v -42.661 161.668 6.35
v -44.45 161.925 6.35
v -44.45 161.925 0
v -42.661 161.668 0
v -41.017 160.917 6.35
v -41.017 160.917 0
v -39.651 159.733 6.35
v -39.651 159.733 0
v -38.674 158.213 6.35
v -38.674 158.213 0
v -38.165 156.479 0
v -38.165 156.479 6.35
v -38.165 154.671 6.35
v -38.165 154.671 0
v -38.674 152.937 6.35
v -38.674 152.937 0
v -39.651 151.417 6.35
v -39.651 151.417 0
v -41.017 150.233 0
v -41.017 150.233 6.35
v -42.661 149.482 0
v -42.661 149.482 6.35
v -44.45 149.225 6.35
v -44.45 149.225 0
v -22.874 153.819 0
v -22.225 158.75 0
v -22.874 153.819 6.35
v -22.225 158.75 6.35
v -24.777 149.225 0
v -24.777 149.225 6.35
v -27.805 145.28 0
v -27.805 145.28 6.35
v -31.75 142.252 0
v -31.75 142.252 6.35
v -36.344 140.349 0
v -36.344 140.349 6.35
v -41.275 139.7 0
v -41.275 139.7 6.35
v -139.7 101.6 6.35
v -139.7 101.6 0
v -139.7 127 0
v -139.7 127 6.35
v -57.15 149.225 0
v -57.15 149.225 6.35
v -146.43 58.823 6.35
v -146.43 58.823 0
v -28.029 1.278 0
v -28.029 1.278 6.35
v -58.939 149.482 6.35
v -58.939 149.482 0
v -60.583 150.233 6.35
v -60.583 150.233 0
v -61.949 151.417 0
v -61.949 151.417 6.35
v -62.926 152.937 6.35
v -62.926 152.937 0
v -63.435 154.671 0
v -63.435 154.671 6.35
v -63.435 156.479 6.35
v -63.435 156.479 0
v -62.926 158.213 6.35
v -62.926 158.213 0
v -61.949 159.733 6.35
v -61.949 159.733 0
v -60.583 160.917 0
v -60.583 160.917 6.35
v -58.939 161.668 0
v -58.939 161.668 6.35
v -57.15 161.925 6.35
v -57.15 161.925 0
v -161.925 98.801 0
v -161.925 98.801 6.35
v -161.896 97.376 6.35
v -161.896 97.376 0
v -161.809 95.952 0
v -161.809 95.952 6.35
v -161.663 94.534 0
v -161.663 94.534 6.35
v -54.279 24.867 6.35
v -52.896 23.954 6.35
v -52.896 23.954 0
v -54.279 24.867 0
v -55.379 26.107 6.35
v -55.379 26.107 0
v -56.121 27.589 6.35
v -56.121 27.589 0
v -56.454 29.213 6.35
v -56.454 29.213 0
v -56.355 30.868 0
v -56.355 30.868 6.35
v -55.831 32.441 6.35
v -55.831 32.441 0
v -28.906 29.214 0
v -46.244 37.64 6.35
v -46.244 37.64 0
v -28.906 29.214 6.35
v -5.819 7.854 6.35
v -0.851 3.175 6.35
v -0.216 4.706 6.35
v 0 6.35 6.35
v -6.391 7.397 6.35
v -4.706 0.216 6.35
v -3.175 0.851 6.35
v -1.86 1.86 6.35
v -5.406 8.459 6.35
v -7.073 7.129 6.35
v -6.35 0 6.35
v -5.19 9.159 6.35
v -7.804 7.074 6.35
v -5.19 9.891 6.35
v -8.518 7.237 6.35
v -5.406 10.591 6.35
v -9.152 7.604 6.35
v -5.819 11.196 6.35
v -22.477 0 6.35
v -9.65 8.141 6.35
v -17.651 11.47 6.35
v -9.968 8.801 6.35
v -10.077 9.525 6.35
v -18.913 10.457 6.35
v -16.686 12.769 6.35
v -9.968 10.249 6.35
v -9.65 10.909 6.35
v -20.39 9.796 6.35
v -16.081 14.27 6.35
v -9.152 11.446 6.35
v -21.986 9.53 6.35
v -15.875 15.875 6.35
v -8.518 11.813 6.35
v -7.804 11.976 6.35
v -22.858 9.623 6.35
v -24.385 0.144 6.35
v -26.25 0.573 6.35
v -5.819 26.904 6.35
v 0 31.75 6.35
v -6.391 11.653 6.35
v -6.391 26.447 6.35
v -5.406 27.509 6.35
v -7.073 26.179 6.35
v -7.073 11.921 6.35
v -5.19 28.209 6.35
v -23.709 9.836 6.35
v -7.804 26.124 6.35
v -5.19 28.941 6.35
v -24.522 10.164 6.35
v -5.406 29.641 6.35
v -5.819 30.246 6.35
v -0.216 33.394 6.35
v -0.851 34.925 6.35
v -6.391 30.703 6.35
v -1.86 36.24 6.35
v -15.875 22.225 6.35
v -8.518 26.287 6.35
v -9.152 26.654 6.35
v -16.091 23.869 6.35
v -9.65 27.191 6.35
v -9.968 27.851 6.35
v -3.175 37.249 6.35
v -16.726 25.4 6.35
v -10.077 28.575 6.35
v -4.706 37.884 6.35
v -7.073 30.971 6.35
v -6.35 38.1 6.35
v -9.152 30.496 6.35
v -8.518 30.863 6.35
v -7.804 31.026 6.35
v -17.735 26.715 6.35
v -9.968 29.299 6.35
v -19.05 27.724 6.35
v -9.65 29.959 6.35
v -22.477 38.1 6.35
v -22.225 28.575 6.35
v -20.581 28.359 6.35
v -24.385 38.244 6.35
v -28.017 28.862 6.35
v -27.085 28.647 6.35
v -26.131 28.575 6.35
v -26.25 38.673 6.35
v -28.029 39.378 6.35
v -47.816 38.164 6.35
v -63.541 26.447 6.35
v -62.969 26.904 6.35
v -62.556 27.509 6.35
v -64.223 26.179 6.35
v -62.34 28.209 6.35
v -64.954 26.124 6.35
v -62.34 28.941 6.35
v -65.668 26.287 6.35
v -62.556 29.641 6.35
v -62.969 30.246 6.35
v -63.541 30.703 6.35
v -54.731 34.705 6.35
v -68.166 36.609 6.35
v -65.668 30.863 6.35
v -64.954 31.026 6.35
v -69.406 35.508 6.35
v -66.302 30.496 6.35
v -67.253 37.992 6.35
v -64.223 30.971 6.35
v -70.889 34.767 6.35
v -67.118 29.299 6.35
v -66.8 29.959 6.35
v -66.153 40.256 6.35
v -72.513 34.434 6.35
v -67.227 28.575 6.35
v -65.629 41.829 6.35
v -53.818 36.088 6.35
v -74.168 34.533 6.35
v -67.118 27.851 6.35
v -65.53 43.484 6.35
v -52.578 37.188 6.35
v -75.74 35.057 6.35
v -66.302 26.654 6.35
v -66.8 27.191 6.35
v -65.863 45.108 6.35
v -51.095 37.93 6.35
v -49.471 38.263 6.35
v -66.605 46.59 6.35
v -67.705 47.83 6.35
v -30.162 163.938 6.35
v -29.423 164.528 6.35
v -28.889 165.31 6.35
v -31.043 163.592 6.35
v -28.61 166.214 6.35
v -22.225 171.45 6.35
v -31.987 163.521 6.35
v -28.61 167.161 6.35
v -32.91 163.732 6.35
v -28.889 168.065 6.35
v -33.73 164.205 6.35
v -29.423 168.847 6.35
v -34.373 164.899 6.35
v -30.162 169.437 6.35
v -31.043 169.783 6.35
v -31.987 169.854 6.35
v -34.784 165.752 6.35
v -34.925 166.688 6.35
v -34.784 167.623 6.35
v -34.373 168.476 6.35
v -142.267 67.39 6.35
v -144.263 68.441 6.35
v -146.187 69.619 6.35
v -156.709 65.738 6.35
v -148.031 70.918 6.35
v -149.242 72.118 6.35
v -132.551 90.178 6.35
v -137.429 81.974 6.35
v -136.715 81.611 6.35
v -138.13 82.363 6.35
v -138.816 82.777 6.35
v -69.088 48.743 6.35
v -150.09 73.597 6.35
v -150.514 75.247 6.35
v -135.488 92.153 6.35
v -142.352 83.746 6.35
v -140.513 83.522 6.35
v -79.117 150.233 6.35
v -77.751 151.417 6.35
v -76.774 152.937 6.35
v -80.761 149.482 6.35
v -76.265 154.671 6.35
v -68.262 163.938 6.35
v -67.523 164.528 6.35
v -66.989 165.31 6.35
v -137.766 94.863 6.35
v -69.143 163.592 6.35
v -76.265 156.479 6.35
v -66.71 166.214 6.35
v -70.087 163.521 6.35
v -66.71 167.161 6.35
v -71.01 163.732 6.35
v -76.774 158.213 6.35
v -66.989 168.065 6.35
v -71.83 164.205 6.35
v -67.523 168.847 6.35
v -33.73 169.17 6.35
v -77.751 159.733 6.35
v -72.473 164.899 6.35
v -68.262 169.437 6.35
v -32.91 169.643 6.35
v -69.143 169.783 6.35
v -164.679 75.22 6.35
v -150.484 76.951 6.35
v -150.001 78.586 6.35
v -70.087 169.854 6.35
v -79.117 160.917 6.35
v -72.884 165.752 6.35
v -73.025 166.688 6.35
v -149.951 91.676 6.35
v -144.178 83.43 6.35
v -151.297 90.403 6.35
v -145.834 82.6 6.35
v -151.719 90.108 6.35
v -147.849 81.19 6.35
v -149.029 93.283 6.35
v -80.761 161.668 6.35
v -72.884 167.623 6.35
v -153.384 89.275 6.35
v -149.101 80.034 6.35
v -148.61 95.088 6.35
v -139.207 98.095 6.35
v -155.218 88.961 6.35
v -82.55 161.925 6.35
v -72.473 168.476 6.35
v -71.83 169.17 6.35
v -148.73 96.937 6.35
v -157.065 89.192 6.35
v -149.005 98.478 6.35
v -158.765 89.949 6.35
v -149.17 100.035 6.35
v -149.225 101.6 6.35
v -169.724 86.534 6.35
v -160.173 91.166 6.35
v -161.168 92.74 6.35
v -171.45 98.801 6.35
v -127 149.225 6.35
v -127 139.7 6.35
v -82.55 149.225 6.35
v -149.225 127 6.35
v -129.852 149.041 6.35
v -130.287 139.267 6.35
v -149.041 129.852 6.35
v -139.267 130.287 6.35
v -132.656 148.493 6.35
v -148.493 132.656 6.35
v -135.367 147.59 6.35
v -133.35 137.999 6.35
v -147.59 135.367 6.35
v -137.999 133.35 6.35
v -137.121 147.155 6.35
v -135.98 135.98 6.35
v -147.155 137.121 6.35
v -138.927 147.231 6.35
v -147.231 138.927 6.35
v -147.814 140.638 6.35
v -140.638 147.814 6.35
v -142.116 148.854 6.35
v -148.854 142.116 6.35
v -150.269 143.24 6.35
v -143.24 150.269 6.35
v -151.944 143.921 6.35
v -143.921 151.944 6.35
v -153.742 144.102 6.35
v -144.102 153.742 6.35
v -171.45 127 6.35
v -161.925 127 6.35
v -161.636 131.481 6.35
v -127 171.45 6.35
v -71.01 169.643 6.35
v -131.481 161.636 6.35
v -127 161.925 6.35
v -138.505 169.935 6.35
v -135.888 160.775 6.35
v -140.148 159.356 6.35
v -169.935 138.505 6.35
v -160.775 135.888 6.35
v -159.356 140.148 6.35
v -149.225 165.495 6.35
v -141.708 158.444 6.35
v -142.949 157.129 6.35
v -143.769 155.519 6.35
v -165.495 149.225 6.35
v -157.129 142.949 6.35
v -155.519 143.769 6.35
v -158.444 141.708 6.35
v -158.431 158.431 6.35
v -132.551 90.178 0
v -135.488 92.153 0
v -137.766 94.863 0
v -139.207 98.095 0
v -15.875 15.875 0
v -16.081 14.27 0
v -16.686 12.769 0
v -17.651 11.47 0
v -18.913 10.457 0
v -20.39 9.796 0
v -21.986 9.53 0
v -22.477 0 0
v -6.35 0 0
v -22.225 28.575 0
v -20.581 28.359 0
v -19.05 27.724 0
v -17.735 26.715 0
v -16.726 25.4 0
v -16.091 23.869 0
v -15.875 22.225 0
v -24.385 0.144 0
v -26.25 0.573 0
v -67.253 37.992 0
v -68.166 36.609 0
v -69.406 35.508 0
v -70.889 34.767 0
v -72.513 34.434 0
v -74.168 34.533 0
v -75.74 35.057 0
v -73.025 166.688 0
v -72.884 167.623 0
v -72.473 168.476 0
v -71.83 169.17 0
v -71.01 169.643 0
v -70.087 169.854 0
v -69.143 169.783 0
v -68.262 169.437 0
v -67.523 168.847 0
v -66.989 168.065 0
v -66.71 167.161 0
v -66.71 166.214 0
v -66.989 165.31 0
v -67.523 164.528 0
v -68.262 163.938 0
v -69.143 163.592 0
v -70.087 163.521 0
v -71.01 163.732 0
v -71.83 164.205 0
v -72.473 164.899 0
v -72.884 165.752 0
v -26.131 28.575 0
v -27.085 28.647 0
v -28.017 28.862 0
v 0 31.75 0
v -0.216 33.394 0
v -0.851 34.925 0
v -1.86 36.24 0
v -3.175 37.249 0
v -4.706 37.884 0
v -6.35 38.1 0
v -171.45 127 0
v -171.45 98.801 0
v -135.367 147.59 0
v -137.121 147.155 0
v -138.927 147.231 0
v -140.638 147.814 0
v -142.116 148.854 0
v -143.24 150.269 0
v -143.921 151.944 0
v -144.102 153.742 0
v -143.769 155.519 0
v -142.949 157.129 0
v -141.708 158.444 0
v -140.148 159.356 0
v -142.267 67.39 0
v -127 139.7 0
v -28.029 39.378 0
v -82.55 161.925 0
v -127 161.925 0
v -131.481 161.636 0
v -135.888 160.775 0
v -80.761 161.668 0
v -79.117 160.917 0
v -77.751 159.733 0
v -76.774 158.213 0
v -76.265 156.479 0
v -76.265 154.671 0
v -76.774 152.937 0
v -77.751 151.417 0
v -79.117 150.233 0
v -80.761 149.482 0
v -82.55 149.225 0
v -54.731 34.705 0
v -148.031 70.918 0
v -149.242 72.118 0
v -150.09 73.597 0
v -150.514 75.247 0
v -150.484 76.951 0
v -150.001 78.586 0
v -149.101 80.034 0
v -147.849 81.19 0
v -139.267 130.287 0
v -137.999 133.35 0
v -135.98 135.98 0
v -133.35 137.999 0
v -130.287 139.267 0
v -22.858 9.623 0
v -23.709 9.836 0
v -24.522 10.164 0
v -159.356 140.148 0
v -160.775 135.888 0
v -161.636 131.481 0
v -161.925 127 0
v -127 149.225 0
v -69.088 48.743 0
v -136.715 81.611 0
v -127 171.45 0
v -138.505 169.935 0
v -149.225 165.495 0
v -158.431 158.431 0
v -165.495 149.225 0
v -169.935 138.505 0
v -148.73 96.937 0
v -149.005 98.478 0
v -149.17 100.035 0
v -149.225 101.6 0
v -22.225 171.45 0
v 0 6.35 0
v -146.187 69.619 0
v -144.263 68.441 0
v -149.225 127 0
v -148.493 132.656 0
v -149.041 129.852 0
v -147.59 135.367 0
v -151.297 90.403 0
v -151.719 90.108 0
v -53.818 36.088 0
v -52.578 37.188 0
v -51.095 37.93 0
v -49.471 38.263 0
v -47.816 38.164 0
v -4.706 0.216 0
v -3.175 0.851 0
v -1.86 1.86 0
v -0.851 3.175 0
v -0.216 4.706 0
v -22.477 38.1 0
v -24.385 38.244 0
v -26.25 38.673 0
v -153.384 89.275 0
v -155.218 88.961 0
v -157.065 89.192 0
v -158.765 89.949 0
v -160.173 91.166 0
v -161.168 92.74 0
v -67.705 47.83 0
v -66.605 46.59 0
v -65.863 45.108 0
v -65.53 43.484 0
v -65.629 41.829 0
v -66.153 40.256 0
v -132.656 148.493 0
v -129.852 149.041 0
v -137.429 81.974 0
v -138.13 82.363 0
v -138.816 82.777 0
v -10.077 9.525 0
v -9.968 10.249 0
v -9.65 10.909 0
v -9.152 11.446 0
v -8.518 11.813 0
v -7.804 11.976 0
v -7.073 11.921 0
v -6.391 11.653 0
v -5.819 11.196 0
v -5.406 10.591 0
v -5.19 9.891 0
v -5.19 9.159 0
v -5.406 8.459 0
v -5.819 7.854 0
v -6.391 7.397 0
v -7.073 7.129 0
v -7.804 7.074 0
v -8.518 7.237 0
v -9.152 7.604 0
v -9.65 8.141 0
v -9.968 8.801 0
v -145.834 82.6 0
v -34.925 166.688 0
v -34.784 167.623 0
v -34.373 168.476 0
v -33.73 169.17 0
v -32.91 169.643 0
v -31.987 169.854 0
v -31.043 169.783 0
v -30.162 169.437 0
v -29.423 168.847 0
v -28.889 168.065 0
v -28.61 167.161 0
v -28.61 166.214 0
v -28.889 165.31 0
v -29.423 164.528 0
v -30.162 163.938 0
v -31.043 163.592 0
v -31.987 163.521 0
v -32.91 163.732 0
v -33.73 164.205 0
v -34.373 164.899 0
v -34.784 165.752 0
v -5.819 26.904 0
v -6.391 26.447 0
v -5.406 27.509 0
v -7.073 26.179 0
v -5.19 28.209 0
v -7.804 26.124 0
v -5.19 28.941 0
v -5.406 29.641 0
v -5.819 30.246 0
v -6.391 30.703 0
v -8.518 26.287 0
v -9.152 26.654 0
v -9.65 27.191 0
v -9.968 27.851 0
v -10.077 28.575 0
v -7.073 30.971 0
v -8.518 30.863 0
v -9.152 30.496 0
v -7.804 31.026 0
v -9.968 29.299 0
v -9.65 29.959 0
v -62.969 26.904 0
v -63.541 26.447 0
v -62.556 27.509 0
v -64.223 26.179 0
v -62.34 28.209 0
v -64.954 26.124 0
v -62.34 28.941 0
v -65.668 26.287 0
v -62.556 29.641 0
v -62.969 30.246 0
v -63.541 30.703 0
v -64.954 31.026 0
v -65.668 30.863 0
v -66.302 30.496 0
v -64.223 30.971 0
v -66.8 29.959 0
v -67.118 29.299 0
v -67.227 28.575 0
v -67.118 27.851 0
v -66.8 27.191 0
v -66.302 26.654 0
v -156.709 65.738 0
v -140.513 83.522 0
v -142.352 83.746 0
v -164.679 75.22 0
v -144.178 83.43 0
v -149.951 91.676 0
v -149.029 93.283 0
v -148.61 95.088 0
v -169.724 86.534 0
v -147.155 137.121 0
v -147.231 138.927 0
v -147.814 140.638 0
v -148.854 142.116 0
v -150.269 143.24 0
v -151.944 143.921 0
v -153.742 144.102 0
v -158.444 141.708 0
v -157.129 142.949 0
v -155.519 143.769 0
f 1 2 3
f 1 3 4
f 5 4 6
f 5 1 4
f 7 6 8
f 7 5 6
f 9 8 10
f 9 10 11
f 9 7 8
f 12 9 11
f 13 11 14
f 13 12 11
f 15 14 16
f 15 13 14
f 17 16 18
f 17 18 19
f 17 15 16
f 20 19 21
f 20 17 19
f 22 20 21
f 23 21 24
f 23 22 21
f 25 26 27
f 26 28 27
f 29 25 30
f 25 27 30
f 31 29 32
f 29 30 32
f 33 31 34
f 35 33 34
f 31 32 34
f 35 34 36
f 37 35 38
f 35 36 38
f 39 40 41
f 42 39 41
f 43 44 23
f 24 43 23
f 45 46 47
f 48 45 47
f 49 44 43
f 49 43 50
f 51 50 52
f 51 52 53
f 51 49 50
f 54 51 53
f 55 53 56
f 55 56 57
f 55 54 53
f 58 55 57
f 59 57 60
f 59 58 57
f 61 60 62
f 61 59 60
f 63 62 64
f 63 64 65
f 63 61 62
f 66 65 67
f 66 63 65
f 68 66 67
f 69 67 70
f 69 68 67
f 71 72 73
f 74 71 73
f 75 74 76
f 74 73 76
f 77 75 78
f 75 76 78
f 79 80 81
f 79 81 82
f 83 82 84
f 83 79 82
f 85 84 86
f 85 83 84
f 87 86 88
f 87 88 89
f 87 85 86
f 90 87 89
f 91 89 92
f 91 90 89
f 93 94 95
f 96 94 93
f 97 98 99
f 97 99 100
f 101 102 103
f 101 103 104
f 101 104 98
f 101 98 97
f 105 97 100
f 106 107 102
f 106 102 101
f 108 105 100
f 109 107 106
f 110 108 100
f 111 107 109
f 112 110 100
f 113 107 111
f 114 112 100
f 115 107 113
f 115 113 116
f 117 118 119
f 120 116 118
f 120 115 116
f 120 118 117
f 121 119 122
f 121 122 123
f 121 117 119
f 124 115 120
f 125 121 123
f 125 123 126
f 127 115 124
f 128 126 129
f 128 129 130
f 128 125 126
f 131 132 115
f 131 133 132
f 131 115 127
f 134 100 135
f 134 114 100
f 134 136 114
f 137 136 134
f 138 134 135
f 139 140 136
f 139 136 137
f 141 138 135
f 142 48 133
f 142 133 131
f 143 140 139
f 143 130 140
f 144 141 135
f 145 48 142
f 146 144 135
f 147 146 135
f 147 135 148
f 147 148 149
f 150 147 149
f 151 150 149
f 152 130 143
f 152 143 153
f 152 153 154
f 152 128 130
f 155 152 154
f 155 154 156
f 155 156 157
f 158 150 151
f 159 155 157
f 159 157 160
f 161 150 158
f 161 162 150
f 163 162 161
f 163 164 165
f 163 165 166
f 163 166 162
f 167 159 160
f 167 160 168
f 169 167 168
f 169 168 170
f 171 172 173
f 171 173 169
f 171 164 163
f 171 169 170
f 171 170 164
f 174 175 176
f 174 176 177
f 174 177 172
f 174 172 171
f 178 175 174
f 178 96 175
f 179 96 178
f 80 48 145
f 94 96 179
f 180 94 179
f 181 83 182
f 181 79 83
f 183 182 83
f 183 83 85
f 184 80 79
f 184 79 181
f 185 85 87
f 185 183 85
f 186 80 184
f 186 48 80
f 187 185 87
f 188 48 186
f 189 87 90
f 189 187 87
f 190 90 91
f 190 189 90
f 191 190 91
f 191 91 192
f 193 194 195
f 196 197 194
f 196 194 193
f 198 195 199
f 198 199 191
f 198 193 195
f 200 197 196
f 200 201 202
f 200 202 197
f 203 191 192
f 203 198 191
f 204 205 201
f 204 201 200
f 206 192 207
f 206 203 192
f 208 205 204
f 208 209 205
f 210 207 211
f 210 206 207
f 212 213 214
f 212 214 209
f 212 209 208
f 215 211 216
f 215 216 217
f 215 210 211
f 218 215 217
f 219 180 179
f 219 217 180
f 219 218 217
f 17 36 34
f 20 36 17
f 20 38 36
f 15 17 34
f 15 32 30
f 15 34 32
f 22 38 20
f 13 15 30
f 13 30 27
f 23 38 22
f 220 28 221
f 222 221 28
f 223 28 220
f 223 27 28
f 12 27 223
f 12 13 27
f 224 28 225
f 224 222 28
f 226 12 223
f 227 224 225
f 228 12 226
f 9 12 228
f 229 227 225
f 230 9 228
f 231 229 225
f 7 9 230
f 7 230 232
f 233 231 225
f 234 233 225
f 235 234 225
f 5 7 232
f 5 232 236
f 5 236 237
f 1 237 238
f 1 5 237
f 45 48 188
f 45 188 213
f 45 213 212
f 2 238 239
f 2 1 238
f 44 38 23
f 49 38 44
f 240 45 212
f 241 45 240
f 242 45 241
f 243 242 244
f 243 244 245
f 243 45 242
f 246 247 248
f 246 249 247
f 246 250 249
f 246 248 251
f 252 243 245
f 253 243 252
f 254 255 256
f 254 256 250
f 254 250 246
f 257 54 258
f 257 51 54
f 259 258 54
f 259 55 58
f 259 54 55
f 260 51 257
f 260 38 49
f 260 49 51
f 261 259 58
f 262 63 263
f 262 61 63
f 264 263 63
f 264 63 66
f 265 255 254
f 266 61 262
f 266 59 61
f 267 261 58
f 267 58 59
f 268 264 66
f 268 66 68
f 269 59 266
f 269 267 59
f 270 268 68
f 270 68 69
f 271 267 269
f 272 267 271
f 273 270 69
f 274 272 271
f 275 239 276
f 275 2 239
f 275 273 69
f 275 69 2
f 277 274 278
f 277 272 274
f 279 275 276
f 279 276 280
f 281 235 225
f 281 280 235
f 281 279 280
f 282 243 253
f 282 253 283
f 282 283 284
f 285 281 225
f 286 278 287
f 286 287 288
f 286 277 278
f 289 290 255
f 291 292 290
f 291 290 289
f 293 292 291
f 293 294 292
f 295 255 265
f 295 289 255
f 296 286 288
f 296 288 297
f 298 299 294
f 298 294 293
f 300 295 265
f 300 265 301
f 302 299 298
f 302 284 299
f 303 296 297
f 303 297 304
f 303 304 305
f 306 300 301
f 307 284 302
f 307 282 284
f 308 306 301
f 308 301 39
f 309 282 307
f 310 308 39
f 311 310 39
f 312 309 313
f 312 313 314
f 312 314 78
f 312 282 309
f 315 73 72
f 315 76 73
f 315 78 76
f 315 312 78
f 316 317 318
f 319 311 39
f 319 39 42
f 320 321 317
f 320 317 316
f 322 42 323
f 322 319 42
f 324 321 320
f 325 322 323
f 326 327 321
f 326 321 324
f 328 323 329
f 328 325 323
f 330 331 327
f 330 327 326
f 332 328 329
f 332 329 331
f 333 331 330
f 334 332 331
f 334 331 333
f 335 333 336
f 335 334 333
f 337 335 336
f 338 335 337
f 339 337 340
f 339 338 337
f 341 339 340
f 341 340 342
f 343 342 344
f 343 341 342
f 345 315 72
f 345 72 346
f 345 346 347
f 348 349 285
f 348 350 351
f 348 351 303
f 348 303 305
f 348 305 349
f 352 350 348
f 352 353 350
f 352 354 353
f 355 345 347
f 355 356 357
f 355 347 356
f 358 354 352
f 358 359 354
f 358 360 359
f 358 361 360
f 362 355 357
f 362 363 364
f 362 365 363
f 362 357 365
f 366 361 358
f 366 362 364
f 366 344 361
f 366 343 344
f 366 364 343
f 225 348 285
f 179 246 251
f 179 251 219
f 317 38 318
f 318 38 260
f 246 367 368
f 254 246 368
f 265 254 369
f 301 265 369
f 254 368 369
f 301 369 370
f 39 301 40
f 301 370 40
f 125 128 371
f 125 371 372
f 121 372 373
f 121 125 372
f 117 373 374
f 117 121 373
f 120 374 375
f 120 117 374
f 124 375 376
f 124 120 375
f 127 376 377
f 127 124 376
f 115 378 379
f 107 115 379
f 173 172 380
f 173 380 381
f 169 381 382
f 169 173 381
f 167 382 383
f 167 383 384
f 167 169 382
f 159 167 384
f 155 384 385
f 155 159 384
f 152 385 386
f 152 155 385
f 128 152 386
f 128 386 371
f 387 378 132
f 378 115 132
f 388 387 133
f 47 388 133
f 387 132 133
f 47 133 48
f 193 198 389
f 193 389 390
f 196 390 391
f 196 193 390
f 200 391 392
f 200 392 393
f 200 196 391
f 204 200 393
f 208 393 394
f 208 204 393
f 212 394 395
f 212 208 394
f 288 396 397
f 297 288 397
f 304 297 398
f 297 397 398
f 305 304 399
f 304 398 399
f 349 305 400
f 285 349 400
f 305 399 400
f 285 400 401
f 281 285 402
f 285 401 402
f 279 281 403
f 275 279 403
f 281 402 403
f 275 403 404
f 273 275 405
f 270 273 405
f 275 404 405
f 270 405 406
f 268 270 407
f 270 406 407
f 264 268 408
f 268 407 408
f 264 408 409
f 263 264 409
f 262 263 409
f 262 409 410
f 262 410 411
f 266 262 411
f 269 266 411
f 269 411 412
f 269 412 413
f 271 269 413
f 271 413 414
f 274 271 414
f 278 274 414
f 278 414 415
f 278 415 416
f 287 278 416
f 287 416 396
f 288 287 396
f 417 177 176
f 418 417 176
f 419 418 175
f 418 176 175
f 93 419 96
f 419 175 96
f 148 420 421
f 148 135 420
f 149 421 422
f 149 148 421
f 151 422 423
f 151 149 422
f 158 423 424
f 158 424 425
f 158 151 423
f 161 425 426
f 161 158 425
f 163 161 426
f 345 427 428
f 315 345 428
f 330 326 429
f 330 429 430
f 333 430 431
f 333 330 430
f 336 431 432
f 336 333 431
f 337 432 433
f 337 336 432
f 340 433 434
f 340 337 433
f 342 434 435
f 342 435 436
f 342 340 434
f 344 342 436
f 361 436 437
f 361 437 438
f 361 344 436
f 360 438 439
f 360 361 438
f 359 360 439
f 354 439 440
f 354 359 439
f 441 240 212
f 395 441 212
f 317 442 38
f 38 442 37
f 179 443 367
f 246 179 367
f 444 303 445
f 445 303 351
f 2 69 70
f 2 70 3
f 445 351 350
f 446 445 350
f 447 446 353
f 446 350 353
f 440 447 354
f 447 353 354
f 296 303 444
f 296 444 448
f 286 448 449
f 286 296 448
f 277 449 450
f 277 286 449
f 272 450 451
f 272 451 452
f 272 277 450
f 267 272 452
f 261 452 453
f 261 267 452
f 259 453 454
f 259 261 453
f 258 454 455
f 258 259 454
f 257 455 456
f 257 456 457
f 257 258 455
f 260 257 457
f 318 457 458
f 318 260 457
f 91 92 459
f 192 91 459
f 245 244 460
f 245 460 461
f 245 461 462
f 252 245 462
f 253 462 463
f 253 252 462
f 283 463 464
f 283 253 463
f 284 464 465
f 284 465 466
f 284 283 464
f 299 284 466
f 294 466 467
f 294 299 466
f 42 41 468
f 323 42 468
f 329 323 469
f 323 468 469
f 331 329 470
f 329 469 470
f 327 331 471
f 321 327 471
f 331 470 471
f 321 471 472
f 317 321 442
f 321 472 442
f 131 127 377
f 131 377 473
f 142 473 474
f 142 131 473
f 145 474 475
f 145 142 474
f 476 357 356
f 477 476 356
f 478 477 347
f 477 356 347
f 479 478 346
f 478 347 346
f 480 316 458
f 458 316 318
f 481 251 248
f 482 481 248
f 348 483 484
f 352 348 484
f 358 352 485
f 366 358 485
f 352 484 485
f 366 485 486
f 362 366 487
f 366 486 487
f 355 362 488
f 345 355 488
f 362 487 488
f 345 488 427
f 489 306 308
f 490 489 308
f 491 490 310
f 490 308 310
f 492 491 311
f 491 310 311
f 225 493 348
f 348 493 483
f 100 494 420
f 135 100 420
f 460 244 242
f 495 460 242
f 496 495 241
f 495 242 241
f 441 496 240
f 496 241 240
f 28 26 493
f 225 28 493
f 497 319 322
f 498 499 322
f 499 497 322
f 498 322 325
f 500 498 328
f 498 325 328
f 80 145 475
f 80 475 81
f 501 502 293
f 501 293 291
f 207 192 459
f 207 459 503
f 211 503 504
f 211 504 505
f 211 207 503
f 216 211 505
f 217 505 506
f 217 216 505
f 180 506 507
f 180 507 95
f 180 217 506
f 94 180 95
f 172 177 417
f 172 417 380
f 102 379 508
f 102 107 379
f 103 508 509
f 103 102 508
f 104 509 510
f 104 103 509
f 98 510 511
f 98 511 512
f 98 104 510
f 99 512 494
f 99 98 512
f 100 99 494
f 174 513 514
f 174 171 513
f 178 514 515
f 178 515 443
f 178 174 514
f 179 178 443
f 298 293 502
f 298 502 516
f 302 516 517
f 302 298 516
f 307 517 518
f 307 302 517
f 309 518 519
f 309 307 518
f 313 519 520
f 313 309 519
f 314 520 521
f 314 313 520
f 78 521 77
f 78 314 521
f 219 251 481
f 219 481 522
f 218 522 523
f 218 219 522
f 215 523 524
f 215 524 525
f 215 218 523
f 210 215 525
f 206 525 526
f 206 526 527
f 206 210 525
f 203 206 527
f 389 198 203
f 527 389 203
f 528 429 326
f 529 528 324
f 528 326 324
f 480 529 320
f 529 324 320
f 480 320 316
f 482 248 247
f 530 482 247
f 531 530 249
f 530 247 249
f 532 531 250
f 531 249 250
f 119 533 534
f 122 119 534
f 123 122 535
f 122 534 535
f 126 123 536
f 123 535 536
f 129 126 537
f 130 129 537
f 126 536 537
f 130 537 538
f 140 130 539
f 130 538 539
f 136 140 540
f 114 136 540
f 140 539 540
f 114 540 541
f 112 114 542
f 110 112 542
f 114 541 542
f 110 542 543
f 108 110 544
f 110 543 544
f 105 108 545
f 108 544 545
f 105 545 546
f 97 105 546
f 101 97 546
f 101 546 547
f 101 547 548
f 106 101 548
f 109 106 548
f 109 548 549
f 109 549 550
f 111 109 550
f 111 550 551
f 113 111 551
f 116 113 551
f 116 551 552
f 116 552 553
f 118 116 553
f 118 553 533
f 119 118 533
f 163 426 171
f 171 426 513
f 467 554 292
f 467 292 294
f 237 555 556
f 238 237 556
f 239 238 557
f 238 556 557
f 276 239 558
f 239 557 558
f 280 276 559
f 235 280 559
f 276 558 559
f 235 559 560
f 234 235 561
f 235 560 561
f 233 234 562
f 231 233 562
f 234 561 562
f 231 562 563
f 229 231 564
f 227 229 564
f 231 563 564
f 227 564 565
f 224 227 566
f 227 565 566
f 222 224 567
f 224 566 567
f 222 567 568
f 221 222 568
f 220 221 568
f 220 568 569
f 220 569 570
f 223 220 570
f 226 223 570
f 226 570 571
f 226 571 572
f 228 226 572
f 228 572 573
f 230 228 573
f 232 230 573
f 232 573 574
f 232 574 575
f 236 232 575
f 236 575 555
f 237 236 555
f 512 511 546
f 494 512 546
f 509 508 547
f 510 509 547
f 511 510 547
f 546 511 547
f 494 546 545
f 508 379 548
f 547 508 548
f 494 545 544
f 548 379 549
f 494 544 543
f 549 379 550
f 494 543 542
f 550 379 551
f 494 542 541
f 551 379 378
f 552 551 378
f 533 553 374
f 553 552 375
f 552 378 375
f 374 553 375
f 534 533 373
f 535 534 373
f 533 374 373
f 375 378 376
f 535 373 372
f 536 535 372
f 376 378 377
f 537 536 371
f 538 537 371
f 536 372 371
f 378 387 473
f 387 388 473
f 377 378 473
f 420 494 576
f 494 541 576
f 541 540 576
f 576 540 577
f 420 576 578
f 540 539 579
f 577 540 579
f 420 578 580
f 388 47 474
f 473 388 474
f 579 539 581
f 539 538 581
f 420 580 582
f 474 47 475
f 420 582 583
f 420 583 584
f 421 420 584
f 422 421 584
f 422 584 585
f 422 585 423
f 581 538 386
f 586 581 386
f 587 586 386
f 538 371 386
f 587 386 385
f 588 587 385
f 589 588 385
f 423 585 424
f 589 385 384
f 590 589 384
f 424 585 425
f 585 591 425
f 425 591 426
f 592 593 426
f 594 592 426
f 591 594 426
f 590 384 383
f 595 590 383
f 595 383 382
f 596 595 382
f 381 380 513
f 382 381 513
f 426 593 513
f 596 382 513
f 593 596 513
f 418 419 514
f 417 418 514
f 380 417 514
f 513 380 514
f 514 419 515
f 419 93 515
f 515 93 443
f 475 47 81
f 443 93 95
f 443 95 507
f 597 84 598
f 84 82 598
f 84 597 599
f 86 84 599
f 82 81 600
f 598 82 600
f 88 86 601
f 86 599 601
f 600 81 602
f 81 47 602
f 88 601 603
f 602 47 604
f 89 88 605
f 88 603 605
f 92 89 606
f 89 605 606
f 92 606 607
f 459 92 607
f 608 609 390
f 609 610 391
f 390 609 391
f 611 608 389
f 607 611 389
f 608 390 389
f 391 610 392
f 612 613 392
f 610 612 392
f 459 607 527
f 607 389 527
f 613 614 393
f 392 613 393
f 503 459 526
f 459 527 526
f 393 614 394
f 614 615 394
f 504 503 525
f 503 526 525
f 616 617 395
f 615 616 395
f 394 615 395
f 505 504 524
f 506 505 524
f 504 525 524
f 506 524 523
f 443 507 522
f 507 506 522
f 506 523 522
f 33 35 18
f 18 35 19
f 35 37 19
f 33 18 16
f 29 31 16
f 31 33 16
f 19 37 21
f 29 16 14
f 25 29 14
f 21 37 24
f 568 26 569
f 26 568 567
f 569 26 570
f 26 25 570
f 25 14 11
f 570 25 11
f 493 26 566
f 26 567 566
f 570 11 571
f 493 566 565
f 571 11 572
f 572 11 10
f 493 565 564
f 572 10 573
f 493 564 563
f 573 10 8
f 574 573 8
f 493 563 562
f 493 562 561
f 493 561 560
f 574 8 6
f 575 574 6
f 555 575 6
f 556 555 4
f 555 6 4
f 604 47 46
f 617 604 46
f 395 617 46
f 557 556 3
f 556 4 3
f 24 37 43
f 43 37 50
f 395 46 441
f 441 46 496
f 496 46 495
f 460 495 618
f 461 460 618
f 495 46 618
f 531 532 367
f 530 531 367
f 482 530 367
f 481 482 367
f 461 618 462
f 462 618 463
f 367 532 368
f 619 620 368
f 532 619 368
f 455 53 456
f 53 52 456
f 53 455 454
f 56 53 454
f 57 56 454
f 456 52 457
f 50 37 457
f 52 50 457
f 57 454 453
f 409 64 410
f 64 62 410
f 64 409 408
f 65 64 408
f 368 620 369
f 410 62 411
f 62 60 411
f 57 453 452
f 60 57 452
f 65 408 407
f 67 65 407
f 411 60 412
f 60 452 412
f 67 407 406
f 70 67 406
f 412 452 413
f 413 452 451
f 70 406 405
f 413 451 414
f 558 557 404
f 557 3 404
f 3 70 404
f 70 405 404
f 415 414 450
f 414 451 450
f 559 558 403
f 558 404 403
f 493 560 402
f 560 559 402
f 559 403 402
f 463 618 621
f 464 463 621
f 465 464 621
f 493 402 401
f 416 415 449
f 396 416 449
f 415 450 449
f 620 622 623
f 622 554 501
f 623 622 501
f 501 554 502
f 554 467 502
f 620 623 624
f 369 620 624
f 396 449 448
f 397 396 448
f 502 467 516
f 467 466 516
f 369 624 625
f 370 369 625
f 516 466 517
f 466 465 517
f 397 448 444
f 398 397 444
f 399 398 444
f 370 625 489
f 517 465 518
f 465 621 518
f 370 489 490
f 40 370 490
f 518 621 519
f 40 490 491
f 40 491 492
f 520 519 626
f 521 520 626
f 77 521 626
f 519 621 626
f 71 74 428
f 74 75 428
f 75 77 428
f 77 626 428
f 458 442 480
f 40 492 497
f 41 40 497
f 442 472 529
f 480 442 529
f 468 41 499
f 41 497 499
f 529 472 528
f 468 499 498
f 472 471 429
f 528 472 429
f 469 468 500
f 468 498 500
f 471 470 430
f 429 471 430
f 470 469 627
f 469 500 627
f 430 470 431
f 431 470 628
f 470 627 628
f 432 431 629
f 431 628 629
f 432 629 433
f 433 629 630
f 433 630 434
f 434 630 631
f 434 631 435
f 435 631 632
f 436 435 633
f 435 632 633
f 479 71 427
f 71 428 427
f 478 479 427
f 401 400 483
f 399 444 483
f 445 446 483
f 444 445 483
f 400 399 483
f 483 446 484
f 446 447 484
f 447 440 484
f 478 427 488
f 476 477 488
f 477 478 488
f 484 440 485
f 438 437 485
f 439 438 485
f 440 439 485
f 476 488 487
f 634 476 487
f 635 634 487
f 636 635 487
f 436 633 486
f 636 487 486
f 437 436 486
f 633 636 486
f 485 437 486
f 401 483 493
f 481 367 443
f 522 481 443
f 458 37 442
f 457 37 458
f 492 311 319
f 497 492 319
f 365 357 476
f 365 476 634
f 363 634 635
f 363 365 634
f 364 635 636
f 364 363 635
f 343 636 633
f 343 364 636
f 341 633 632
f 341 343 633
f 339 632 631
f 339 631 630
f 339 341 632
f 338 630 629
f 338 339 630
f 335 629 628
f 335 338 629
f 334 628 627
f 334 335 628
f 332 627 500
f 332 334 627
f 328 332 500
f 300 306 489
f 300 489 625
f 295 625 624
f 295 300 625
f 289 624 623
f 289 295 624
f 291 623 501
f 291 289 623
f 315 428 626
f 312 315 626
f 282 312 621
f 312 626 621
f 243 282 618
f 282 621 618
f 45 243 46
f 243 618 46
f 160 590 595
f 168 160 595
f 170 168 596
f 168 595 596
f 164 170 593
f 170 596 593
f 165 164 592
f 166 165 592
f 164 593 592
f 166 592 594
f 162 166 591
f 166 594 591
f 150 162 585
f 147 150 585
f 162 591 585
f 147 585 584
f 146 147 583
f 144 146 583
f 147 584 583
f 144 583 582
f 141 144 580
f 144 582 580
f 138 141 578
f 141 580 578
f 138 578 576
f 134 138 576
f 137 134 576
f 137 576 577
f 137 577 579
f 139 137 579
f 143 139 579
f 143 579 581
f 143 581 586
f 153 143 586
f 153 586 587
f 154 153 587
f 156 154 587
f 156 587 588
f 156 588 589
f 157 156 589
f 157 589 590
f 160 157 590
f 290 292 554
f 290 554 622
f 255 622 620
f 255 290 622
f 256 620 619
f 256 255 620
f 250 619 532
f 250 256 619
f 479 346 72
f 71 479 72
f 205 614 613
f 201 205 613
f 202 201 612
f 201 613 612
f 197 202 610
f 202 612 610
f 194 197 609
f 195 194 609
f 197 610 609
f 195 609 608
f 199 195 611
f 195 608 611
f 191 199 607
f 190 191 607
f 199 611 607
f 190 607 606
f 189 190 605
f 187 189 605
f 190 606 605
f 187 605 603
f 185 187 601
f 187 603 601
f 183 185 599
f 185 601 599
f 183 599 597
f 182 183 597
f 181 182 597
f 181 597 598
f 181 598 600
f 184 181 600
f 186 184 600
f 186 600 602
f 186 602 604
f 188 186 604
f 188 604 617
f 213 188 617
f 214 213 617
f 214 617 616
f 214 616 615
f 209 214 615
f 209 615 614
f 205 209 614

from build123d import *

# Parameters (mm, degrees)
BOSS_EXTRUDE1_DEPTH              = 6.35
F_1_4_0_25_DIAMETER_HOLE1_D      = 6.35
F_1_4_0_25_DIAMETER_HOLE1_DEPTH  = 9.652
F_1_4_0_25_DIAMETER_HOLE1_TIP    = 1.9077324654125039
F_10_0_1935_DIAMETER_HOLE1_D     = 4.9149
F_10_0_1935_DIAMETER_HOLE1_DEPTH = 9.652
F_10_0_1935_DIAMETER_HOLE1_TIP   = 1.476584928229278
FILLET1_R                        = 12.7
FILLET2_R                        = 6.35
SKETCH8_W                        = 25.40000000000005
SKETCH8_H                        = 12.699999999999989
CUT_EXTRUDE3_DEPTH               = 243.55005153576033
FILLET4_R                        = 6.35
FILLET5_R                        = 19.05


with BuildPart() as part:
    # Sketch1 → Boss-Extrude1 (new body)
    with BuildSketch(Plane.XY):
        with BuildLine():
            Line((0, 0), (0, 38.1))
            Line((0, 38.1), (-25.400000000000002, 38.1))
            Line((-25.400000000000002, 38.1), (-132.55149215165815, 90.17761255734695))
            ThreePointArc((-132.55149215165815, 90.17761255734695), (-137.76554574385477, 94.862565411303), (-139.70000000000002, 101.6))
            Line((-139.70000000000002, 101.6), (-139.70000000000002, 127))
            ThreePointArc((-139.70000000000002, 127), (-135.98025612106917, 135.98025612106917), (-127, 139.69999999999996))
            Line((-127, 139.69999999999996), (-22.22499999999998, 139.7))
            Line((-22.22499999999998, 139.7), (-22.224999999999984, 171.45))
            Line((-22.224999999999984, 171.45), (-127, 171.45))
            ThreePointArc((-127, 171.45), (-158.430896423742, 158.43089642374204), (-171.45, 127))
            Line((-171.45, 127), (-171.45, 98.80128898397304))
            ThreePointArc((-171.45, 98.80128898397304), (-164.67941010349165, 75.22026792353354), (-146.43022253080355, 58.82293293468738))
            Line((-146.43022253080355, 58.82293293468738), (-25.4, -3.11e-15))
            Line((-25.4, -3.11e-15), (0, 0))
        make_face()
    extrude(amount=BOSS_EXTRUDE1_DEPTH)

    # 1/4 (0.25) Diameter Hole1
    with Locations(Plane.XY.offset(6.35)):
        with Locations((-69.85, 166.6875), (-31.75, 166.6875)):
            Hole(F_1_4_0_25_DIAMETER_HOLE1_D / 2, depth=F_1_4_0_25_DIAMETER_HOLE1_DEPTH)
            with Locations((0, 0, -(F_1_4_0_25_DIAMETER_HOLE1_DEPTH + F_1_4_0_25_DIAMETER_HOLE1_TIP / 2))):  # 118° drill point
                Cone(0, F_1_4_0_25_DIAMETER_HOLE1_D / 2, F_1_4_0_25_DIAMETER_HOLE1_TIP, mode=Mode.SUBTRACT)

    # #10 (0.1935) Diameter Hole1
    with Locations(Plane.XY.offset(6.35)):
        with Locations((-7.62, 28.575), (-7.62, 9.525), (-64.77, 28.575)):
            Hole(F_10_0_1935_DIAMETER_HOLE1_D / 2, depth=F_10_0_1935_DIAMETER_HOLE1_DEPTH)
            with Locations((0, 0, -(F_10_0_1935_DIAMETER_HOLE1_DEPTH + F_10_0_1935_DIAMETER_HOLE1_TIP / 2))):  # 118° drill point
                Cone(0, F_10_0_1935_DIAMETER_HOLE1_D / 2, F_10_0_1935_DIAMETER_HOLE1_TIP, mode=Mode.SUBTRACT)

    # Fillet1
    fillet1_edges = [part.edges().sort_by_distance(p)[0] for p in [
        (-25.4, -3.11e-15, 3.175),
        (-25.400000000000002, 38.1, 3.175),
    ]]
    fillet(fillet1_edges, radius=FILLET1_R)

    # Fillet2
    fillet2_edges = [part.edges().sort_by_distance(p)[0] for p in [
        (0, 38.1, 3.175),
        (0, 0, 3.175),
    ]]
    fillet(fillet2_edges, radius=FILLET2_R)

    # Sketch8 → Cut-Extrude3 (cut, through all)
    with BuildSketch(Plane.XY.offset(6.35)):
        with BuildLine():
            Line((-76.19999999999997, 161.92499999999998), (-127, 161.92499999999998))
            ThreePointArc((-127, 161.92499999999998), (-138.12882691189947, 160.1044534249545), (-148.09742202888222, 154.83261411968402))
            Line((-148.09742202888222, 154.83261411968402), (-138.98279839171374, 145.71799048251555))
            ThreePointArc((-138.98279839171374, 145.71799048251555), (-133.24272722958852, 148.33023632632685), (-127, 149.225))
            Line((-127, 149.225), (-76.19999999999997, 149.225))
            Line((-76.19999999999997, 149.225), (-76.19999999999997, 161.92499999999998))
        make_face()
        with BuildLine():
            Line((-161.925, 127), (-161.925, 98.80128898397304))
            ThreePointArc((-161.925, 98.80128898397304), (-161.20295128798153, 91.73632272842997), (-159.06666080504155, 84.96348244484211))
            Line((-159.06666080504155, 84.96348244484211), (-147.51497280949854, 93.050934809844))
            ThreePointArc((-147.51497280949854, 93.050934809844), (-148.79330052666535, 97.24079397659989), (-149.225, 101.6))
            Line((-149.225, 101.6), (-149.225, 127))
            ThreePointArc((-149.225, 127), (-148.33023632632688, 133.2427272295885), (-145.71799048251557, 138.98279839171371))
            Line((-145.71799048251557, 138.98279839171371), (-154.83261411968402, 148.09742202888222))
            ThreePointArc((-154.83261411968402, 148.09742202888222), (-160.1044534249545, 138.12882691189947), (-161.925, 127))
        make_face()
        with BuildLine():
            Line((-142.05216791273205, 85.24815404527915), (-154.12206516409194, 76.79789819448892))
            ThreePointArc((-154.12206516409194, 76.79789819448892), (-148.7100954330638, 71.44388813361326), (-142.2666034170599, 67.38972351667718))
            Line((-142.2666034170599, 67.38972351667718), (-70.02909509590478, 32.28095466133805))
            Line((-70.02909509590478, 32.28095466133805), (-63.37728743967065, 45.967279376904486))
            Line((-63.37728743967065, 45.967279376904486), (-136.7151112654018, 81.61082197535714))
            ThreePointArc((-136.7151112654018, 81.61082197535714), (-139.51647217144776, 83.23458278771281), (-142.05216791273205, 85.24815404527915))
        make_face()
        Polygon((-51.95489999701758, 40.415787225246326), (-27.59207003743942, 28.574999999999996), (-15.875, 28.574999999999996), (-15.874999999999996, 9.525000000000002), (-23.20792996256074, 9.524999999999999), (-58.6067076532517, 26.729462509679877), align=None)
        with Locations((-50.79999999999999, 155.575)):
            Rectangle(SKETCH8_W, SKETCH8_H)
    extrude(amount=-CUT_EXTRUDE3_DEPTH, mode=Mode.SUBTRACT)

    # Fillet4
    # the kernel refuses this fillet: 6.35 mm, written as the material it adds along each edge
    with BuildSketch(Plane(origin=(-23.20792996256074, 9.524999999999999, 6.35), x_dir=(-0.899400586035673, 0.43712536627229515, 0), z_dir=(0, 0, -1))) as fillet4_piece_1:
        with BuildLine():
            CenterArc((FILLET4_R * 0.230138586608, FILLET4_R), FILLET4_R, 244.0793884634155, 25.920611536584488)
            Line((-FILLET4_R * 0.206986779664, FILLET4_R * 0.100599413964), (0, 0))
            Line((0, 0), (FILLET4_R * 0.230138586608, 1e-17))
        make_face()
    extrude(amount=6.35)
    with BuildSketch(Plane(origin=(-15.874999999999996, 9.525000000000002, 6.35), x_dir=(-1, -5.6e-16, 0), z_dir=(0, 0, -1))) as fillet4_piece_2:
        with BuildLine():
            CenterArc((FILLET4_R, FILLET4_R), FILLET4_R, 180, 90)
            Line((-1.78e-15, FILLET4_R), (0, 0))
            Line((0, 0), (FILLET4_R, 0))
        make_face()
    extrude(amount=6.35)
    with BuildSketch(Plane(origin=(-15.875, 28.574999999999996, 6.35), x_dir=(2.8e-16, -1, 0), z_dir=(0, 0, -1))) as fillet4_piece_3:
        with BuildLine():
            CenterArc((FILLET4_R, FILLET4_R), FILLET4_R, 180, 90)
            Line((-1.78e-15, FILLET4_R), (0, 0))
            Line((0, 0), (FILLET4_R, 0))
        make_face()
    extrude(amount=6.35)
    with BuildSketch(Plane(origin=(-58.6067076532517, 26.729462509679877, 6.35), x_dir=(0.43712536627229537, 0.8994005860356729, 0), z_dir=(0, 0, -1))) as fillet4_piece_4:
        with BuildLine():
            CenterArc((FILLET4_R, FILLET4_R), FILLET4_R, 180.00000000000009, 89.99999999999989)
            Line((3.06e-15, FILLET4_R), (0, 0))
            Line((0, 0), (FILLET4_R, -1.1e-16))
        make_face()
    extrude(amount=6.35)
    with BuildSketch(Plane(origin=(-51.95489999701758, 40.415787225246326, 6.35), x_dir=(-0.43712536627229487, -0.899400586035673, 0), z_dir=(0, 0, -1))) as fillet4_piece_5:
        with BuildLine():
            CenterArc((FILLET4_R, -FILLET4_R), FILLET4_R, 90, 90.00000000000011)
            Line((6.47e-15, -FILLET4_R), (0, 0))
            Line((0, 0), (FILLET4_R, 9e-17))
        make_face()
    extrude(amount=6.35)
    with BuildSketch(Plane(origin=(-63.37728743967065, 45.967279376904486, 6.35), x_dir=(-0.43712536627229537, -0.8994005860356729, 0), z_dir=(0, 0, -1))) as fillet4_piece_6:
        with BuildLine():
            CenterArc((FILLET4_R, FILLET4_R), FILLET4_R, 179.9999999999999, 90.00000000000011)
            Line((6e-15, FILLET4_R), (0, 0))
            Line((0, 0), (FILLET4_R, -1.1e-16))
        make_face()
    extrude(amount=6.35)
    with BuildSketch(Plane(origin=(-70.02909509590478, 32.28095466133805, 6.35), x_dir=(-0.8994005860356724, 0.4371253662722963, 0), z_dir=(0, 0, -1))) as fillet4_piece_7:
        with BuildLine():
            CenterArc((FILLET4_R, FILLET4_R), FILLET4_R, 179.99999999999994, 90)
            Line((6.38e-15, FILLET4_R), (0, 0))
            Line((0, 0), (FILLET4_R, 5e-17))
        make_face()
    extrude(amount=6.35)
    with BuildSketch(Plane(origin=(-154.12206516409194, 76.79789819448892, 6.35), x_dir=(0.819189581581614, 0.57352282380751, 0), z_dir=(0, 0, -1))) as fillet4_piece_8:
        with BuildLine():
            CenterArc((7.657764037607667, 6.350000000000007), FILLET4_R, 162.02178891468273, 107.97821108531724)
            ThreePointArc((1.6178093721145603, 8.3099611319585), (0.5561766270605806, 4.204182459459689), (0, 0))
            Line((0, 0), (7.657764037607664, -3.7e-16))
        make_face()
    extrude(amount=6.35)
    with BuildSketch(Plane(origin=(-142.05216791273205, 85.24815404527915, 6.35), x_dir=(-0.819189581581615, -0.5735228238075083, 0), z_dir=(0, 0, -1))) as fillet4_piece_9:
        with BuildLine():
            CenterArc((4.61697327270199, -6.350000000000006), FILLET4_R, 89.99999999999986, 67.11461952384218)
            ThreePointArc((-1.2331843436193552, -3.880555555555626), (-0.5275365740025959, -1.9685783567426014), (0, 0))
            Line((0, 0), (4.616973272702006, 1e-17))
        make_face()
    extrude(amount=6.35)
    with BuildSketch(Plane(origin=(-147.51497280949854, 93.050934809844, 6.35), x_dir=(-0.8191895815816139, -0.57352282380751, 0), z_dir=(0, 0, -1))) as fillet4_piece_10:
        with BuildLine():
            CenterArc((4.616973272701946, 6.350000000000006), FILLET4_R, 202.885380476159, 67.11461952384093)
            ThreePointArc((-1.2331843436193741, 3.880555555555511), (-0.5275365740026128, 1.9685783567425768), (0, 0))
            Line((0, 0), (4.616973272701943, 4e-17))
        make_face()
    extrude(amount=6.35)
    with BuildSketch(Plane(origin=(-159.06666080504155, 84.96348244484211, 6.35), x_dir=(-0.261857934927054, 0.9651064303566413, 0), z_dir=(0, 0, -1))) as fillet4_piece_11:
        with BuildLine():
            CenterArc((9.014629990057857, 6.285687270412339), FILLET4_R, 160.18408388914497, 117.9773499711298)
            Line((3.0406348569099713, 8.438332654381856), (0, 0))
            ThreePointArc((0, 0), (4.958046494531804, -0.35372001273222614), (9.916092989063605, -6e-17))
        make_face()
    extrude(amount=6.35)
    with BuildSketch(Plane(origin=(-154.83261411968402, 148.09742202888222, 6.35), x_dir=(0.7071067811865458, -0.7071067811865492, 0), z_dir=(0, 0, -1))) as fillet4_piece_12:
        with BuildLine():
            CenterArc((8.273051090908108, 6.350000000000015), FILLET4_R, 157.11461952384028, 112.88538047615978)
            ThreePointArc((2.4228934745868353, 8.819444444444574), (0.9214926410236765, 4.489378927608573), (0, 0))
            Line((0, 0), (8.273051090908114, -9e-17))
        make_face()
    extrude(amount=6.35)
    with BuildSketch(Plane(origin=(-145.71799048251557, 138.98279839171371, 6.35), x_dir=(-0.45974256906919553, -0.8880522339286445, 0), z_dir=(0, 0, -1))) as fillet4_piece_13:
        with BuildLine():
            CenterArc((4.653471653105217, 6.323301651399347), FILLET4_R, 197.6295027961731, 67.11461952384201)
            Line((-1.3982996116780777, 4.400136406615789), (0, 0))
            ThreePointArc((0, 0), (2.0358938482335205, 0.09344422010227843), (4.071787696467069, -1.1e-16))
        make_face()
    extrude(amount=6.35)
    with BuildSketch(Plane(origin=(-138.98279839171374, 145.71799048251555, 6.35), x_dir=(-0.7071067811865475, 0.7071067811865475, 0), z_dir=(0, 0, -1))) as fillet4_piece_14:
        with BuildLine():
            CenterArc((4.616973272701996, 6.349999999999994), FILLET4_R, 202.88538047615842, 67.11461952384161)
            ThreePointArc((-1.2331843436193233, 3.88055555555557), (-0.5275365740025925, 1.9685783567425814), (0, 0))
            Line((0, 0), (4.616973272701996, 6e-17))
        make_face()
    extrude(amount=6.35)
    with BuildSketch(Plane(origin=(-148.09742202888222, 154.83261411968402, 6.35), x_dir=(0.869162224980119, 0.4945270737458255, 0), z_dir=(0, 0, -1))) as fillet4_piece_15:
        with BuildLine():
            CenterArc((8.314729193934072, 6.29532785360028), FILLET4_R, 164.63856988037904, 112.88538047615813)
            Line((2.1915896078739827, 7.977487658619955), (0, 0))
            ThreePointArc((0, 0), (4.573101056663757, -0.30069680519851316), (9.14620211332749, -1.3e-16))
        make_face()
    extrude(amount=6.35)
    with BuildSketch(Plane(origin=(-76.19999999999997, 149.225, 6.35), x_dir=(-1, 0, 0), z_dir=(0, 0, -1))) as fillet4_piece_16:
        with BuildLine():
            CenterArc((FILLET4_R, FILLET4_R), FILLET4_R, 180, 90)
            Line((0, FILLET4_R), (0, 0))
            Line((0, 0), (FILLET4_R, 0))
        make_face()
    extrude(amount=6.35)
    with BuildSketch(Plane(origin=(-76.19999999999997, 161.92499999999998, 6.35), x_dir=(-1, 0, 0), z_dir=(0, 0, -1))) as fillet4_piece_17:
        with BuildLine():
            CenterArc((FILLET4_R, -FILLET4_R), FILLET4_R, 90, 90)
            Line((0, -FILLET4_R), (0, 0))
            Line((0, 0), (FILLET4_R, 0))
        make_face()
    extrude(amount=6.35)
    with BuildSketch(Plane(origin=(-38.099999999999966, 149.225, 6.35), x_dir=(-1, 0, 0), z_dir=(0, 0, -1))) as fillet4_piece_18:
        with BuildLine():
            CenterArc((FILLET4_R, FILLET4_R), FILLET4_R, 180, 90)
            Line((0, FILLET4_R), (0, 0))
            Line((0, 0), (FILLET4_R, 0))
        make_face()
    extrude(amount=6.35)
    with BuildSketch(Plane(origin=(-38.099999999999966, 161.92499999999998, 6.35), x_dir=(0, -1, 0), z_dir=(0, 0, -1)), Plane(origin=(-63.500000000000014, 149.225, 6.35), x_dir=(0, 1, 0), z_dir=(0, 0, -1))) as fillet4_piece_19:
        with BuildLine():
            CenterArc((FILLET4_R, FILLET4_R), FILLET4_R, 180, 90)
            Line((0, FILLET4_R), (0, 0))
            Line((0, 0), (FILLET4_R, 0))
        make_face()
    extrude(amount=6.35)
    with BuildSketch(Plane(origin=(-63.500000000000014, 161.92499999999998, 6.35), x_dir=(0, -1, 0), z_dir=(0, 0, -1))) as fillet4_piece_20:
        with BuildLine():
            CenterArc((FILLET4_R, -FILLET4_R), FILLET4_R, 90, 90)
            Line((0, -FILLET4_R), (0, 0))
            Line((0, 0), (FILLET4_R, 0))
        make_face()
    extrude(amount=6.35)
    # the kernel refuses this fillet: 6.35 mm, written as the material it takes off along each edge
    with BuildSketch(Plane(origin=(-27.592070037439417, 28.574999999999996, 10.003450062398983), x_dir=(1, 0, 0), z_dir=(0, 0, -1))) as fillet4_2_piece_1:
        with BuildLine():
            CenterArc((FILLET4_R * 0.230138586608, -FILLET4_R), FILLET4_R, 90, 25.920611536584403)
            Line((-FILLET4_R * 0.206986779664, -FILLET4_R * 0.100599413964), (0, 0))
            Line((0, 0), (FILLET4_R * 0.230138586608, 0))
        make_face()
    extrude(amount=13.656900124797966, mode=Mode.SUBTRACT)

    # Fillet5
    fillet5_edges = [part.edges().sort_by_distance(p)[0] for p in [
        (-22.22499999999998, 139.7, 3.175),
    ]]
    fillet(fillet5_edges, radius=FILLET5_R)


solid = part.part
